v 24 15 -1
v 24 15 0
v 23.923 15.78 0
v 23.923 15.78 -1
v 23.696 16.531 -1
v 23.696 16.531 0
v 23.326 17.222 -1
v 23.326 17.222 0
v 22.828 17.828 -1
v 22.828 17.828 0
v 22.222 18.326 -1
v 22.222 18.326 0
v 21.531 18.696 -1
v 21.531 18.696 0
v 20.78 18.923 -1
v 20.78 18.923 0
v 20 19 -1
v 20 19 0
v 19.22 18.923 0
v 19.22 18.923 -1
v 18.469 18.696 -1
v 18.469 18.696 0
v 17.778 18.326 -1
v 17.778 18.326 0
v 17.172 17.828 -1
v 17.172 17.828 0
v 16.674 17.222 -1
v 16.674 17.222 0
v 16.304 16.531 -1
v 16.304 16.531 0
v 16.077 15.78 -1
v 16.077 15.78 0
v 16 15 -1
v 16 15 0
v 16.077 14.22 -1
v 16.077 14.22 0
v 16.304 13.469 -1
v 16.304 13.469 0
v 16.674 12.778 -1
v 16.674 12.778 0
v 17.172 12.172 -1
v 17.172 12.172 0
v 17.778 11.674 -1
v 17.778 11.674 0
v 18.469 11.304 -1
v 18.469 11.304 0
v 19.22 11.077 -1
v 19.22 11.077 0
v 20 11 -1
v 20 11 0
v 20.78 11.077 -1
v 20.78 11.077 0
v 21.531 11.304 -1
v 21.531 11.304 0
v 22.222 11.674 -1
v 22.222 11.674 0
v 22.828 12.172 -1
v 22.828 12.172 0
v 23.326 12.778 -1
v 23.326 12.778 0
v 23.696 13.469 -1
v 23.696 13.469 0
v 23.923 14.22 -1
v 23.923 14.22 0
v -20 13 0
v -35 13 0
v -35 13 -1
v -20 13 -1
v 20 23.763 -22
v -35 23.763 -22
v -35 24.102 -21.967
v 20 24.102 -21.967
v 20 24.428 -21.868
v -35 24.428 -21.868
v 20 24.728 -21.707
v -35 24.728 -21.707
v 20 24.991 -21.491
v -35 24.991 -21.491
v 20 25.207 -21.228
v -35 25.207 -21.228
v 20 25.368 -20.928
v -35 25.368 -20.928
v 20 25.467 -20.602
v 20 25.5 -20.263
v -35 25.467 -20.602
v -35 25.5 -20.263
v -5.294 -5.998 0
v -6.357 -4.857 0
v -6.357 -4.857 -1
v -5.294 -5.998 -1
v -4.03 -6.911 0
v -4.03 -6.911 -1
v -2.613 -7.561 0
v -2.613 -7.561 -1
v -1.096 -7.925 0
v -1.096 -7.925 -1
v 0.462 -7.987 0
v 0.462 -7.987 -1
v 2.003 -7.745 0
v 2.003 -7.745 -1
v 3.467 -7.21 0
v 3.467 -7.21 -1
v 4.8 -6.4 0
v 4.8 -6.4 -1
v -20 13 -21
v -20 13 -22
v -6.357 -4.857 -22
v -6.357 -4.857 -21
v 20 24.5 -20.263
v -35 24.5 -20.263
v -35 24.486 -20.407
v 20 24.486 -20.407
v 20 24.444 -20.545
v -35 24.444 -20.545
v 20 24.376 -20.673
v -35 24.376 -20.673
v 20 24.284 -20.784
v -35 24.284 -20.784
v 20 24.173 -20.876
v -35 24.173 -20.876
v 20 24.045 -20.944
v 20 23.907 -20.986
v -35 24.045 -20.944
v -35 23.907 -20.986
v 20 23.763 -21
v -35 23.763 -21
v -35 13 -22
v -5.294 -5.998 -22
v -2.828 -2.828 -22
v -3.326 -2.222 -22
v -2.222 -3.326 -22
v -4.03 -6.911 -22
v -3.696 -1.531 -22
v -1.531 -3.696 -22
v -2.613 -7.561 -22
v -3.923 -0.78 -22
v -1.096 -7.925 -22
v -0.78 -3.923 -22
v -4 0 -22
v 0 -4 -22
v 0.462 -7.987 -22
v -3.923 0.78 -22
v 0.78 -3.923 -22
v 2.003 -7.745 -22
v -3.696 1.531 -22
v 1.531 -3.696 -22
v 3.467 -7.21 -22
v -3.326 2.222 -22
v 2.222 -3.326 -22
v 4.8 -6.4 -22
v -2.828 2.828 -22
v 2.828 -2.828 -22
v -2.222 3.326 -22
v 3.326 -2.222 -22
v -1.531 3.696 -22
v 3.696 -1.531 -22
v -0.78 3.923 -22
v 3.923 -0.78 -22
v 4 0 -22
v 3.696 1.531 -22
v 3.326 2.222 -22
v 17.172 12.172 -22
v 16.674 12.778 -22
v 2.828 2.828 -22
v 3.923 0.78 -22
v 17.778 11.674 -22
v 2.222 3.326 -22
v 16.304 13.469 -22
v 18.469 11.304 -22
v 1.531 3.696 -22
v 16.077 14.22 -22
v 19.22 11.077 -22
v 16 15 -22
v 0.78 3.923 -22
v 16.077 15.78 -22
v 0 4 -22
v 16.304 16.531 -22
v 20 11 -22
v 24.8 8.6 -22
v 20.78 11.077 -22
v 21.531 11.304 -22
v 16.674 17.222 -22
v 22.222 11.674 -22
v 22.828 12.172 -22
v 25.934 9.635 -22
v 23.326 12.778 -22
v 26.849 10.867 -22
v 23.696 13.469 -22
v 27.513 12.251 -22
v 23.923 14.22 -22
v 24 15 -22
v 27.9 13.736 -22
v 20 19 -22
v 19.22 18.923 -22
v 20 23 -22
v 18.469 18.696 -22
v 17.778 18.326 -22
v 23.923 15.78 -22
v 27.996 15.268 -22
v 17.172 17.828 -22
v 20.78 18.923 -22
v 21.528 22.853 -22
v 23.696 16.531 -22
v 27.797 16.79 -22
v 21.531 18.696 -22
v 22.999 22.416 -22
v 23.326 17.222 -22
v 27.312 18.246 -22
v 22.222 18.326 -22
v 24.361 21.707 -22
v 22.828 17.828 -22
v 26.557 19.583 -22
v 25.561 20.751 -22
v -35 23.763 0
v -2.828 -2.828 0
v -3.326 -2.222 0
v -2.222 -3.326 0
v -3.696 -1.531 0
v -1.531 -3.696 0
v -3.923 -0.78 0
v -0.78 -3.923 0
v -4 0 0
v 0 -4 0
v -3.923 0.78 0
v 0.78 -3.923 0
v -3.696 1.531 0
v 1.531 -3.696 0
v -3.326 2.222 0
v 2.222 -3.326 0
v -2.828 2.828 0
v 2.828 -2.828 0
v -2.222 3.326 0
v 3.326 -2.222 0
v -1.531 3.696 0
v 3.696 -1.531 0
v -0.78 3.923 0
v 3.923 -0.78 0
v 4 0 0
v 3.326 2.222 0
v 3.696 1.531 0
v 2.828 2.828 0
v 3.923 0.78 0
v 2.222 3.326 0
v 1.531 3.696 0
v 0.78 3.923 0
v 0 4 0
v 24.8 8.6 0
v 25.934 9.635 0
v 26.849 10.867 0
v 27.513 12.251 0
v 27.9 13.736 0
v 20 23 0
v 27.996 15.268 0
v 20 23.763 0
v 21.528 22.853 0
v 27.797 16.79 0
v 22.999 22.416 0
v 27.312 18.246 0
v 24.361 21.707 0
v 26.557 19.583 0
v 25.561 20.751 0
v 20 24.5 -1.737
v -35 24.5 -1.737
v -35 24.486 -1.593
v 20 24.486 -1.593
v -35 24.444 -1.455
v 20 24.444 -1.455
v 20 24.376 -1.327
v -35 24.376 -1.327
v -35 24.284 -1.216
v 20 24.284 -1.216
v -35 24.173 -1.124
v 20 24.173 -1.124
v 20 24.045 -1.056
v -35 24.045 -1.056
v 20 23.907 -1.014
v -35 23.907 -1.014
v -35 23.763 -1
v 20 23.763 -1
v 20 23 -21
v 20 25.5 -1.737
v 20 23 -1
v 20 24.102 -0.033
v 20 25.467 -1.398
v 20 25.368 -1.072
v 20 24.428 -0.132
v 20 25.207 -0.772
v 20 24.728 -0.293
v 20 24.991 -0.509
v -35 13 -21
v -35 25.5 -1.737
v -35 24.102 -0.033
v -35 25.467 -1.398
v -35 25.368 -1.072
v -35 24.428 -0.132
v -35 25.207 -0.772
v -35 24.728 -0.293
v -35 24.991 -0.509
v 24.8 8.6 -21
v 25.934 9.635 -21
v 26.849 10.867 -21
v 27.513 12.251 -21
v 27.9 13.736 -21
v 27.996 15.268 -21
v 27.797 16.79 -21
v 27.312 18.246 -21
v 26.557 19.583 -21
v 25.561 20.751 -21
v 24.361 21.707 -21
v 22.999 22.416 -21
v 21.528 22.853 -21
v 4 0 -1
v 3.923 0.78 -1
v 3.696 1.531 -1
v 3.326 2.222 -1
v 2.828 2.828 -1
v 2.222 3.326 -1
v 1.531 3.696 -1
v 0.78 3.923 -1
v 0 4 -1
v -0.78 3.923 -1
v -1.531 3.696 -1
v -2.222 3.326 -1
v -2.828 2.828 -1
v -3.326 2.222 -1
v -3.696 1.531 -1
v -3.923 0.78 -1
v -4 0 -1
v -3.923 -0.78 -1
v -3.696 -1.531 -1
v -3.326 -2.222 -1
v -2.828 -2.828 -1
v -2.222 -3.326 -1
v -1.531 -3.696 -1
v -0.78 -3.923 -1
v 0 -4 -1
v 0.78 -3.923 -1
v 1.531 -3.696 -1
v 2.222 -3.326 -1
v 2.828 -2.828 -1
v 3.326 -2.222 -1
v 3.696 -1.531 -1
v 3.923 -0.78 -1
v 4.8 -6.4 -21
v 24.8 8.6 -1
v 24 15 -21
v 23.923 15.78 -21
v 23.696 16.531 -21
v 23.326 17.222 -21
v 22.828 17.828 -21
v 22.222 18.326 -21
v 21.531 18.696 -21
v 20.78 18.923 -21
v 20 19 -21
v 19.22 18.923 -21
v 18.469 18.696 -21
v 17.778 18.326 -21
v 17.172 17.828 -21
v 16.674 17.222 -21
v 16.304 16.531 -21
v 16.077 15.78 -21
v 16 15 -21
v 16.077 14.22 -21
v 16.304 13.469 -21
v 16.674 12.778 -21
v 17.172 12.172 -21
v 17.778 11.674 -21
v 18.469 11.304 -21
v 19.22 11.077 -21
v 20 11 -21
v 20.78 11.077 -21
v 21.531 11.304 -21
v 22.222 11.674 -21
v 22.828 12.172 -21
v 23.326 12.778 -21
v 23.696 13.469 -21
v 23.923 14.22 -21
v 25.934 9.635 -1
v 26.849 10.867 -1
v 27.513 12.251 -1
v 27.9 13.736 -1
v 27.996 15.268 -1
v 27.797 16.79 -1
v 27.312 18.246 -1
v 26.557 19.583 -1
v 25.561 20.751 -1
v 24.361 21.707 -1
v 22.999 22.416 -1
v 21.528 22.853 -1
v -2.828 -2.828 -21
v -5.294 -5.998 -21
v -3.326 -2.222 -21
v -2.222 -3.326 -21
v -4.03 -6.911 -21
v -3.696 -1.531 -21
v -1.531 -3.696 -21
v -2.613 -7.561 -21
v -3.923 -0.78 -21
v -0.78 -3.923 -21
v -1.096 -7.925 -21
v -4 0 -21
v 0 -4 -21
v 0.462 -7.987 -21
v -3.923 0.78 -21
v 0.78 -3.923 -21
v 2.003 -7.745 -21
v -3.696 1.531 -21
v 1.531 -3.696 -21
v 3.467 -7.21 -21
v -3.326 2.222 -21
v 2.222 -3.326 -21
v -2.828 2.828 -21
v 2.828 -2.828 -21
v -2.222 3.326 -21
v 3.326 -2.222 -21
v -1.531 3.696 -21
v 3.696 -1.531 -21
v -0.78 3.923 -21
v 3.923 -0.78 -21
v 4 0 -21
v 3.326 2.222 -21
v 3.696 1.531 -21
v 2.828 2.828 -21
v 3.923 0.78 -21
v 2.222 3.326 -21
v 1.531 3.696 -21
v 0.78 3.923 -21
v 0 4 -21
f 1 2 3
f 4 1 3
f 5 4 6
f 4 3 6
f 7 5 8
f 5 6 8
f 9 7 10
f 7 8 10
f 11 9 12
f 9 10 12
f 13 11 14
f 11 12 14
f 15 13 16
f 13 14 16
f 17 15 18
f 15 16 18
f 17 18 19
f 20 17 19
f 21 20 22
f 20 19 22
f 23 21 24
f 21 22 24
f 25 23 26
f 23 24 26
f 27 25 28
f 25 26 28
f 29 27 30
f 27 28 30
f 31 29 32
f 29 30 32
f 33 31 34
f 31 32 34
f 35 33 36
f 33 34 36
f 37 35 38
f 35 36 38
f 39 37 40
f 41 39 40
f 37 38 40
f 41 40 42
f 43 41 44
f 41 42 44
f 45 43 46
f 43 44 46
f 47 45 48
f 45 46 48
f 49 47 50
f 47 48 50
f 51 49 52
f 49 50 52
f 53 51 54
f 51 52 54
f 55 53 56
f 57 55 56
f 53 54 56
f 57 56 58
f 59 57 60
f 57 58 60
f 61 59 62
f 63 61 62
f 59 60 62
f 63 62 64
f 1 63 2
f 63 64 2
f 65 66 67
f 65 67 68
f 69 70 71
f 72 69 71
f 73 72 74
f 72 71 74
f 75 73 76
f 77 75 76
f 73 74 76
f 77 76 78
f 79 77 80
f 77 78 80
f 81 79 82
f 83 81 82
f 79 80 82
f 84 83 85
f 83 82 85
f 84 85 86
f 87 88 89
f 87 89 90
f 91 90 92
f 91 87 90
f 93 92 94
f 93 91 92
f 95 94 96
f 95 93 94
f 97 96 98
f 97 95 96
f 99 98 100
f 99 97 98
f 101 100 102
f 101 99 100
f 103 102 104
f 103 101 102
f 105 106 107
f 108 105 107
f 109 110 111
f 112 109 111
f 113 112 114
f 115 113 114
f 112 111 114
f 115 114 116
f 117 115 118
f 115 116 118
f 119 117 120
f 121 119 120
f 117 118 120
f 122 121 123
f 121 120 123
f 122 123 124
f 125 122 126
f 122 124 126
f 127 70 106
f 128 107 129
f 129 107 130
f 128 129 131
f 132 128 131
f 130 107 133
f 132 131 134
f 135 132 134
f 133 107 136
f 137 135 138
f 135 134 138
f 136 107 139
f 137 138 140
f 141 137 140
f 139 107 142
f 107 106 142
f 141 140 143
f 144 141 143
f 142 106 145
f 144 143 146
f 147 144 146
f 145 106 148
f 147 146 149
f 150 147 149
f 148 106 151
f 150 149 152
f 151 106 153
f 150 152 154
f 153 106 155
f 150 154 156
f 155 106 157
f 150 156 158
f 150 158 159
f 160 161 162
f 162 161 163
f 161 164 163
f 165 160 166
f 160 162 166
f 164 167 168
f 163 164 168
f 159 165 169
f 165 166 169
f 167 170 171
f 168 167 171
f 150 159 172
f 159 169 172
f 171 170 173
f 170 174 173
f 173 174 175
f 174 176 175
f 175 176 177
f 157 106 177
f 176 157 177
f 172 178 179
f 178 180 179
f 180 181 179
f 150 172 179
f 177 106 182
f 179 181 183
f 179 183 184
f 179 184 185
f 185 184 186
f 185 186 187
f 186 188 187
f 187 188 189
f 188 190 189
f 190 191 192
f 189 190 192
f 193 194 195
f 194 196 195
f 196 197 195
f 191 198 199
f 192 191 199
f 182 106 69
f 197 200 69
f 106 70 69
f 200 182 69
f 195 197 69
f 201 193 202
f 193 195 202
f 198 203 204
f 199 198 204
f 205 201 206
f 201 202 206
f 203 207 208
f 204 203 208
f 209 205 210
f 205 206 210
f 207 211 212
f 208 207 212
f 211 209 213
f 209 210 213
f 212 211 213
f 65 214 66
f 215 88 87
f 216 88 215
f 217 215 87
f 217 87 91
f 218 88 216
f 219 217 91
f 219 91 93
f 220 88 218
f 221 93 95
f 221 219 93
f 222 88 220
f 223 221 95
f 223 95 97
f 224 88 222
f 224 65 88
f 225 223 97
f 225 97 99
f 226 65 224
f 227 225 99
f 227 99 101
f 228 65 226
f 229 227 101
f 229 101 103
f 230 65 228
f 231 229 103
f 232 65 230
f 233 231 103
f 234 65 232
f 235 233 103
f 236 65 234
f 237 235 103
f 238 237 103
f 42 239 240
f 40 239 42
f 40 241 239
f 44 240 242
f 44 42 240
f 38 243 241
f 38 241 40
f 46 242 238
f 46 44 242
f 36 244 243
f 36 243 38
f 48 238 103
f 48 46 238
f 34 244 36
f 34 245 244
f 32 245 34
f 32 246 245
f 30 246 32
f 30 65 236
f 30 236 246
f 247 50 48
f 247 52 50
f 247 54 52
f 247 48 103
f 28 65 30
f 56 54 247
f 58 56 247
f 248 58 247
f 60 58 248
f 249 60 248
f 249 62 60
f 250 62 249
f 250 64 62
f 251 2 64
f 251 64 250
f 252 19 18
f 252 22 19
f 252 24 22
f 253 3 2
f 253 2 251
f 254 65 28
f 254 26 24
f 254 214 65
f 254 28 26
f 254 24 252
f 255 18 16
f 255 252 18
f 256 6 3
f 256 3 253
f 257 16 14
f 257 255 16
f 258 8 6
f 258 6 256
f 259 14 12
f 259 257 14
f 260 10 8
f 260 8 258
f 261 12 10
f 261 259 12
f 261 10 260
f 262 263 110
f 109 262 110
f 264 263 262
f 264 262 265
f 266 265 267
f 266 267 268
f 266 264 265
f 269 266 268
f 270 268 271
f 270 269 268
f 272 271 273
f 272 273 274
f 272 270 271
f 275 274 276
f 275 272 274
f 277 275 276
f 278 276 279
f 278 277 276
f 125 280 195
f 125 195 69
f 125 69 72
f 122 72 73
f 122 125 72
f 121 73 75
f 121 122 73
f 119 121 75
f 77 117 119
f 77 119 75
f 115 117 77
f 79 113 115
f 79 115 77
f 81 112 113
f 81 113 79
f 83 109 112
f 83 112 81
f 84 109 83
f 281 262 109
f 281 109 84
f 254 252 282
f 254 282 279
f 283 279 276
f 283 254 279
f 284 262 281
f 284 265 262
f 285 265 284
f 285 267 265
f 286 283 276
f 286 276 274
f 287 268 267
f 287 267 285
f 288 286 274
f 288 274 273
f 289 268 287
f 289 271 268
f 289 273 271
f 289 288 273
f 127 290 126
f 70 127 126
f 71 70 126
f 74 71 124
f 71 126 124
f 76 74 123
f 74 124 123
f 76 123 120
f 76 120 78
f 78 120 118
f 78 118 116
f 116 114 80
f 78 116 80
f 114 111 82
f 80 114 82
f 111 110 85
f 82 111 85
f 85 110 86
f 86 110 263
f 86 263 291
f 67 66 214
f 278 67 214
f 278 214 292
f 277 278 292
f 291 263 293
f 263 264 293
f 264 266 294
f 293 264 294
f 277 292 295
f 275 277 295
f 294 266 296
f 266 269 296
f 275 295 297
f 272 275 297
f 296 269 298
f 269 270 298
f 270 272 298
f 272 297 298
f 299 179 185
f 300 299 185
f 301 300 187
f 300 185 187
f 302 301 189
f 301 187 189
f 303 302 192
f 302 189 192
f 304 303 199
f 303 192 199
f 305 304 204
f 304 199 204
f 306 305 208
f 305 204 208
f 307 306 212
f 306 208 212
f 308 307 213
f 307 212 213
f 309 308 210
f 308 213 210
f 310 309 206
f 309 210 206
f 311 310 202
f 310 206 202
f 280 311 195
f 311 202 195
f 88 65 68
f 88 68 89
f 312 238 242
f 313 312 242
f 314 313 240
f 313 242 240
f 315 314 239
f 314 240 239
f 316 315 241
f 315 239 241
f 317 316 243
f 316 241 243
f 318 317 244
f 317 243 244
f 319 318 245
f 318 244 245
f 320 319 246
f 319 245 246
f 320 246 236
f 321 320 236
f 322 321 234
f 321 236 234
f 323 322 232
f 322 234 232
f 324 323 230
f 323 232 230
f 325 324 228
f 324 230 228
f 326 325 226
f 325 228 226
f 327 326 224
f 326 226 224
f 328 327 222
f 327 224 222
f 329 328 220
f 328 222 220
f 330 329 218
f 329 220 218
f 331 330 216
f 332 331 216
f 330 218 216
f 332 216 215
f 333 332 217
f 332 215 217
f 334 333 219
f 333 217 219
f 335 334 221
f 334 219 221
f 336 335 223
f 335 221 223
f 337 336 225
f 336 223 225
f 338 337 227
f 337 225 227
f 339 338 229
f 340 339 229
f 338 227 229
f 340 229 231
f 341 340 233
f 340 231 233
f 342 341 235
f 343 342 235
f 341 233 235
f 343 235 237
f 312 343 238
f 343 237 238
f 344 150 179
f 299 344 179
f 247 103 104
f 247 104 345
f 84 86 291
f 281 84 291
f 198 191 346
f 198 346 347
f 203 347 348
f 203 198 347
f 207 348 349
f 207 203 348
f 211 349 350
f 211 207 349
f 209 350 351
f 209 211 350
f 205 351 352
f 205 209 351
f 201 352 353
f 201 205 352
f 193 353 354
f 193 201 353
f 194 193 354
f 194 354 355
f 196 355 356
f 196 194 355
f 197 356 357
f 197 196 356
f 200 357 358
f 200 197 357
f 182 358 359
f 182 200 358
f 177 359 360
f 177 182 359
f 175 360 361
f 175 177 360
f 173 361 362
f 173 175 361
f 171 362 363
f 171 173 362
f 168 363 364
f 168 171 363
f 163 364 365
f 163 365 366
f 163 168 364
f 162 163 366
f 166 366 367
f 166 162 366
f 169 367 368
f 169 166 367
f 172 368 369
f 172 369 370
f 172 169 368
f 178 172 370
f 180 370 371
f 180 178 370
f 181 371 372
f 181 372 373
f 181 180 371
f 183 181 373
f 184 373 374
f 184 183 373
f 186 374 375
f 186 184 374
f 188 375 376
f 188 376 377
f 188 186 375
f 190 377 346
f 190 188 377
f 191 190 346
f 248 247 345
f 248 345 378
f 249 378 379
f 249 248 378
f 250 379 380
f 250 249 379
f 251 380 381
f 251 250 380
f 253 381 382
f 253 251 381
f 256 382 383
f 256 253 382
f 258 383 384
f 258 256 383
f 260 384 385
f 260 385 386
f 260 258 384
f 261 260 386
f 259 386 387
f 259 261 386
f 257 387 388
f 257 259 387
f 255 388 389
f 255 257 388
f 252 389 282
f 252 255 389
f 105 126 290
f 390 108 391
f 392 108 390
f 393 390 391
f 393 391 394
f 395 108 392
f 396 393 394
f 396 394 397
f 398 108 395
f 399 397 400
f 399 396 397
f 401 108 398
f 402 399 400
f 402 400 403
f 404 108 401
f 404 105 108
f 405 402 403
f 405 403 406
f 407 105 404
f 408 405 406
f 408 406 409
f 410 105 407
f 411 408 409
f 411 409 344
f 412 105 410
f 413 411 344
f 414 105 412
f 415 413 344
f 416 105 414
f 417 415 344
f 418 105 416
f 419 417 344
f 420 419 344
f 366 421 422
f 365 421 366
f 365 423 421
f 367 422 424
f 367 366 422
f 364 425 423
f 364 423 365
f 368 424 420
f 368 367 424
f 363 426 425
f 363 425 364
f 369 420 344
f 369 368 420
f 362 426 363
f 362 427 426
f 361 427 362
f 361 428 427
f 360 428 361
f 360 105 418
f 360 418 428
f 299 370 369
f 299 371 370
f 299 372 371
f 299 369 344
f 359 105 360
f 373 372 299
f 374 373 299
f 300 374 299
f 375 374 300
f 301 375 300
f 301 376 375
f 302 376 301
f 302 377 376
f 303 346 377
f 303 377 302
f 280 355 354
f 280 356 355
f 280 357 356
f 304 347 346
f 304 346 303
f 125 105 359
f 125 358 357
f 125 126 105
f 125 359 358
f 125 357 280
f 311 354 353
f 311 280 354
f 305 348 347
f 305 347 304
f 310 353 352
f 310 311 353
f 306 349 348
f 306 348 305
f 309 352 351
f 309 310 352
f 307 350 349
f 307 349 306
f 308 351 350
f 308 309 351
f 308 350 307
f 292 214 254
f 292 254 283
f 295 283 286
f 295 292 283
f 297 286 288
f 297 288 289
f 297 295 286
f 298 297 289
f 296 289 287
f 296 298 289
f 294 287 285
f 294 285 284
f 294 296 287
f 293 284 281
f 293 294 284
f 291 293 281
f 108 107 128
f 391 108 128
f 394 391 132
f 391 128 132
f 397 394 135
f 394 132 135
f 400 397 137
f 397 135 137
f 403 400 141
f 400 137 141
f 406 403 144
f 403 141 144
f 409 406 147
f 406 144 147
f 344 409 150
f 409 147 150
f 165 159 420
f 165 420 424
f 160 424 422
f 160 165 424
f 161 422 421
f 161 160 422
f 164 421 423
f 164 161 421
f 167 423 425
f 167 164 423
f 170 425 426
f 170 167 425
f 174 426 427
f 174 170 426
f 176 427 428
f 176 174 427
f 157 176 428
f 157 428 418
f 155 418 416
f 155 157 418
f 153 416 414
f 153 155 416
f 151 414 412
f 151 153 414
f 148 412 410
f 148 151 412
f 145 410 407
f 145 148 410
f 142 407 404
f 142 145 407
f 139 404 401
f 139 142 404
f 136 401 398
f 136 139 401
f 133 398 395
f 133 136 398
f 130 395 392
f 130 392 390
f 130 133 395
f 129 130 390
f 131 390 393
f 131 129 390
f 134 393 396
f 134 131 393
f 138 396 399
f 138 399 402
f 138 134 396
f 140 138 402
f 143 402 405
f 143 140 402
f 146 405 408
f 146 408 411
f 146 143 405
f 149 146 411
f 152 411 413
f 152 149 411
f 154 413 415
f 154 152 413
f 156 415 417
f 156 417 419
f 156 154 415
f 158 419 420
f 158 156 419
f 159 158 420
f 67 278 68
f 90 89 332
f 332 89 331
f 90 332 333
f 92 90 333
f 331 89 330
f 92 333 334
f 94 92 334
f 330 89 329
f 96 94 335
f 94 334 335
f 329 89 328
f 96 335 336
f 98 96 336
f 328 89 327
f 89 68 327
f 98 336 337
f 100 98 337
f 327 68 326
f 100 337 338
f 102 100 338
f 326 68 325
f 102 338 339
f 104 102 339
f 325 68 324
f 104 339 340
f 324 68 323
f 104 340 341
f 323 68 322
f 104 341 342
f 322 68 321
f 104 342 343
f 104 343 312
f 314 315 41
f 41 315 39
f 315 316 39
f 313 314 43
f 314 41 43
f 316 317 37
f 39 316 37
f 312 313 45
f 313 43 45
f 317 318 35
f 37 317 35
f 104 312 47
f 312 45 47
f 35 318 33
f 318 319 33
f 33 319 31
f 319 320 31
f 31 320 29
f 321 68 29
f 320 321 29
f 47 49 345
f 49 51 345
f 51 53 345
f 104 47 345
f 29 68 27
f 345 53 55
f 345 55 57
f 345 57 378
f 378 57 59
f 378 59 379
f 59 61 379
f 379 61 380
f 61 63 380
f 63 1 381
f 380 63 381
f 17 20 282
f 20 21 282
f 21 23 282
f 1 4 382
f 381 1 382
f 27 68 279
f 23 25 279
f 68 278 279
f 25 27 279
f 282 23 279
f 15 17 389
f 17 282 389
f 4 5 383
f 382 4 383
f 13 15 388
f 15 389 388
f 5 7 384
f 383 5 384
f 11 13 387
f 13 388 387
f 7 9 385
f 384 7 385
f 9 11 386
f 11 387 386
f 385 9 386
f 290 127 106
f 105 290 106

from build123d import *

# Parameters (mm, degrees)
SKETCH_1_R                       = 4
SM_BASE_FLANGE_2_DEPTH           = 1
SM_EDGE_FLANGE_2_STRIP_W         = 5.4732
SM_EDGE_FLANGE_2_STRIP_H         = 1
SM_EDGE_FLANGE_2_STRIP_CUT_DEPTH = 55
SM_EDGE_FLANGE_2_DEPTH           = 55


# Sheet-metal steps are written as plain solids
with BuildPart() as part:
    # Sketch 1 → Базовая кромка2 (new body)
    with BuildSketch(Plane.XY):
        with BuildLine():
            Line((-20, 13), (-6.356958393, -4.856859066))
            ThreePointArc((-6.356958393, -4.856859066), (-1.096061515, -7.924559871), (4.8, -6.4))
            Line((4.8, -6.4), (24.8, 8.6))
            ThreePointArc((24.8, 8.6), (27.589466384, 17.529822128), (20, 23))
            Line((20, 23), (20, 25.5))
            Line((20, 25.5), (-20, 25.5))
            Line((-20, 25.5), (-35, 25.5))
            Line((-35, 25.5), (-35, 13))
            Line((-35, 13), (-20, 13))
        make_face()
        Circle(SKETCH_1_R, mode=Mode.SUBTRACT)
        with Locations((20, 15)):
            Circle(SKETCH_1_R, mode=Mode.SUBTRACT)
    extrude(amount=-SM_BASE_FLANGE_2_DEPTH)

    # Ребро-кромка2 strip (across the edge) → Ребро-кромка2 strip cut (cut)
    with BuildSketch(Plane(origin=(-35, 25.5, -1), x_dir=(0, -1, 0), z_dir=(1, 0, 0))):
        with Locations((-1, -0.5)):
            Rectangle(SM_EDGE_FLANGE_2_STRIP_W, SM_EDGE_FLANGE_2_STRIP_H)
    extrude(amount=SM_EDGE_FLANGE_2_STRIP_CUT_DEPTH, mode=Mode.SUBTRACT)

    # Ребро-кромка2 section (across the edge) → Ребро-кромка2 (add)
    with BuildSketch(Plane(origin=(-35, 25.5, -1), x_dir=(0, -1, 0), z_dir=(1, 0, 0))):
        with BuildLine():
            Line((0, 0.7366), (0, 10))
            Line((0, 10), (1, 10))
            Line((1, 10), (1, 0.7366))
            ThreePointArc((1, 0.7366), (1.215745145, 0.215745145), (1.7366, 0))
            Line((1.7366, 0), (1.7366, -1))
            ThreePointArc((1.7366, -1), (0.508638364, -0.491361636), (0, 0.7366))
        make_face()
    extrude(amount=SM_EDGE_FLANGE_2_DEPTH)

    # Зеркальное отражение1: part across face


with BuildPart() as part_1:
    add(part.part)
    add(part.part.mirror(Plane(origin=(-7.5, 25, -11), x_dir=(1, 0, 0), z_dir=(0, 0, -1))))


solid = part_1.part
